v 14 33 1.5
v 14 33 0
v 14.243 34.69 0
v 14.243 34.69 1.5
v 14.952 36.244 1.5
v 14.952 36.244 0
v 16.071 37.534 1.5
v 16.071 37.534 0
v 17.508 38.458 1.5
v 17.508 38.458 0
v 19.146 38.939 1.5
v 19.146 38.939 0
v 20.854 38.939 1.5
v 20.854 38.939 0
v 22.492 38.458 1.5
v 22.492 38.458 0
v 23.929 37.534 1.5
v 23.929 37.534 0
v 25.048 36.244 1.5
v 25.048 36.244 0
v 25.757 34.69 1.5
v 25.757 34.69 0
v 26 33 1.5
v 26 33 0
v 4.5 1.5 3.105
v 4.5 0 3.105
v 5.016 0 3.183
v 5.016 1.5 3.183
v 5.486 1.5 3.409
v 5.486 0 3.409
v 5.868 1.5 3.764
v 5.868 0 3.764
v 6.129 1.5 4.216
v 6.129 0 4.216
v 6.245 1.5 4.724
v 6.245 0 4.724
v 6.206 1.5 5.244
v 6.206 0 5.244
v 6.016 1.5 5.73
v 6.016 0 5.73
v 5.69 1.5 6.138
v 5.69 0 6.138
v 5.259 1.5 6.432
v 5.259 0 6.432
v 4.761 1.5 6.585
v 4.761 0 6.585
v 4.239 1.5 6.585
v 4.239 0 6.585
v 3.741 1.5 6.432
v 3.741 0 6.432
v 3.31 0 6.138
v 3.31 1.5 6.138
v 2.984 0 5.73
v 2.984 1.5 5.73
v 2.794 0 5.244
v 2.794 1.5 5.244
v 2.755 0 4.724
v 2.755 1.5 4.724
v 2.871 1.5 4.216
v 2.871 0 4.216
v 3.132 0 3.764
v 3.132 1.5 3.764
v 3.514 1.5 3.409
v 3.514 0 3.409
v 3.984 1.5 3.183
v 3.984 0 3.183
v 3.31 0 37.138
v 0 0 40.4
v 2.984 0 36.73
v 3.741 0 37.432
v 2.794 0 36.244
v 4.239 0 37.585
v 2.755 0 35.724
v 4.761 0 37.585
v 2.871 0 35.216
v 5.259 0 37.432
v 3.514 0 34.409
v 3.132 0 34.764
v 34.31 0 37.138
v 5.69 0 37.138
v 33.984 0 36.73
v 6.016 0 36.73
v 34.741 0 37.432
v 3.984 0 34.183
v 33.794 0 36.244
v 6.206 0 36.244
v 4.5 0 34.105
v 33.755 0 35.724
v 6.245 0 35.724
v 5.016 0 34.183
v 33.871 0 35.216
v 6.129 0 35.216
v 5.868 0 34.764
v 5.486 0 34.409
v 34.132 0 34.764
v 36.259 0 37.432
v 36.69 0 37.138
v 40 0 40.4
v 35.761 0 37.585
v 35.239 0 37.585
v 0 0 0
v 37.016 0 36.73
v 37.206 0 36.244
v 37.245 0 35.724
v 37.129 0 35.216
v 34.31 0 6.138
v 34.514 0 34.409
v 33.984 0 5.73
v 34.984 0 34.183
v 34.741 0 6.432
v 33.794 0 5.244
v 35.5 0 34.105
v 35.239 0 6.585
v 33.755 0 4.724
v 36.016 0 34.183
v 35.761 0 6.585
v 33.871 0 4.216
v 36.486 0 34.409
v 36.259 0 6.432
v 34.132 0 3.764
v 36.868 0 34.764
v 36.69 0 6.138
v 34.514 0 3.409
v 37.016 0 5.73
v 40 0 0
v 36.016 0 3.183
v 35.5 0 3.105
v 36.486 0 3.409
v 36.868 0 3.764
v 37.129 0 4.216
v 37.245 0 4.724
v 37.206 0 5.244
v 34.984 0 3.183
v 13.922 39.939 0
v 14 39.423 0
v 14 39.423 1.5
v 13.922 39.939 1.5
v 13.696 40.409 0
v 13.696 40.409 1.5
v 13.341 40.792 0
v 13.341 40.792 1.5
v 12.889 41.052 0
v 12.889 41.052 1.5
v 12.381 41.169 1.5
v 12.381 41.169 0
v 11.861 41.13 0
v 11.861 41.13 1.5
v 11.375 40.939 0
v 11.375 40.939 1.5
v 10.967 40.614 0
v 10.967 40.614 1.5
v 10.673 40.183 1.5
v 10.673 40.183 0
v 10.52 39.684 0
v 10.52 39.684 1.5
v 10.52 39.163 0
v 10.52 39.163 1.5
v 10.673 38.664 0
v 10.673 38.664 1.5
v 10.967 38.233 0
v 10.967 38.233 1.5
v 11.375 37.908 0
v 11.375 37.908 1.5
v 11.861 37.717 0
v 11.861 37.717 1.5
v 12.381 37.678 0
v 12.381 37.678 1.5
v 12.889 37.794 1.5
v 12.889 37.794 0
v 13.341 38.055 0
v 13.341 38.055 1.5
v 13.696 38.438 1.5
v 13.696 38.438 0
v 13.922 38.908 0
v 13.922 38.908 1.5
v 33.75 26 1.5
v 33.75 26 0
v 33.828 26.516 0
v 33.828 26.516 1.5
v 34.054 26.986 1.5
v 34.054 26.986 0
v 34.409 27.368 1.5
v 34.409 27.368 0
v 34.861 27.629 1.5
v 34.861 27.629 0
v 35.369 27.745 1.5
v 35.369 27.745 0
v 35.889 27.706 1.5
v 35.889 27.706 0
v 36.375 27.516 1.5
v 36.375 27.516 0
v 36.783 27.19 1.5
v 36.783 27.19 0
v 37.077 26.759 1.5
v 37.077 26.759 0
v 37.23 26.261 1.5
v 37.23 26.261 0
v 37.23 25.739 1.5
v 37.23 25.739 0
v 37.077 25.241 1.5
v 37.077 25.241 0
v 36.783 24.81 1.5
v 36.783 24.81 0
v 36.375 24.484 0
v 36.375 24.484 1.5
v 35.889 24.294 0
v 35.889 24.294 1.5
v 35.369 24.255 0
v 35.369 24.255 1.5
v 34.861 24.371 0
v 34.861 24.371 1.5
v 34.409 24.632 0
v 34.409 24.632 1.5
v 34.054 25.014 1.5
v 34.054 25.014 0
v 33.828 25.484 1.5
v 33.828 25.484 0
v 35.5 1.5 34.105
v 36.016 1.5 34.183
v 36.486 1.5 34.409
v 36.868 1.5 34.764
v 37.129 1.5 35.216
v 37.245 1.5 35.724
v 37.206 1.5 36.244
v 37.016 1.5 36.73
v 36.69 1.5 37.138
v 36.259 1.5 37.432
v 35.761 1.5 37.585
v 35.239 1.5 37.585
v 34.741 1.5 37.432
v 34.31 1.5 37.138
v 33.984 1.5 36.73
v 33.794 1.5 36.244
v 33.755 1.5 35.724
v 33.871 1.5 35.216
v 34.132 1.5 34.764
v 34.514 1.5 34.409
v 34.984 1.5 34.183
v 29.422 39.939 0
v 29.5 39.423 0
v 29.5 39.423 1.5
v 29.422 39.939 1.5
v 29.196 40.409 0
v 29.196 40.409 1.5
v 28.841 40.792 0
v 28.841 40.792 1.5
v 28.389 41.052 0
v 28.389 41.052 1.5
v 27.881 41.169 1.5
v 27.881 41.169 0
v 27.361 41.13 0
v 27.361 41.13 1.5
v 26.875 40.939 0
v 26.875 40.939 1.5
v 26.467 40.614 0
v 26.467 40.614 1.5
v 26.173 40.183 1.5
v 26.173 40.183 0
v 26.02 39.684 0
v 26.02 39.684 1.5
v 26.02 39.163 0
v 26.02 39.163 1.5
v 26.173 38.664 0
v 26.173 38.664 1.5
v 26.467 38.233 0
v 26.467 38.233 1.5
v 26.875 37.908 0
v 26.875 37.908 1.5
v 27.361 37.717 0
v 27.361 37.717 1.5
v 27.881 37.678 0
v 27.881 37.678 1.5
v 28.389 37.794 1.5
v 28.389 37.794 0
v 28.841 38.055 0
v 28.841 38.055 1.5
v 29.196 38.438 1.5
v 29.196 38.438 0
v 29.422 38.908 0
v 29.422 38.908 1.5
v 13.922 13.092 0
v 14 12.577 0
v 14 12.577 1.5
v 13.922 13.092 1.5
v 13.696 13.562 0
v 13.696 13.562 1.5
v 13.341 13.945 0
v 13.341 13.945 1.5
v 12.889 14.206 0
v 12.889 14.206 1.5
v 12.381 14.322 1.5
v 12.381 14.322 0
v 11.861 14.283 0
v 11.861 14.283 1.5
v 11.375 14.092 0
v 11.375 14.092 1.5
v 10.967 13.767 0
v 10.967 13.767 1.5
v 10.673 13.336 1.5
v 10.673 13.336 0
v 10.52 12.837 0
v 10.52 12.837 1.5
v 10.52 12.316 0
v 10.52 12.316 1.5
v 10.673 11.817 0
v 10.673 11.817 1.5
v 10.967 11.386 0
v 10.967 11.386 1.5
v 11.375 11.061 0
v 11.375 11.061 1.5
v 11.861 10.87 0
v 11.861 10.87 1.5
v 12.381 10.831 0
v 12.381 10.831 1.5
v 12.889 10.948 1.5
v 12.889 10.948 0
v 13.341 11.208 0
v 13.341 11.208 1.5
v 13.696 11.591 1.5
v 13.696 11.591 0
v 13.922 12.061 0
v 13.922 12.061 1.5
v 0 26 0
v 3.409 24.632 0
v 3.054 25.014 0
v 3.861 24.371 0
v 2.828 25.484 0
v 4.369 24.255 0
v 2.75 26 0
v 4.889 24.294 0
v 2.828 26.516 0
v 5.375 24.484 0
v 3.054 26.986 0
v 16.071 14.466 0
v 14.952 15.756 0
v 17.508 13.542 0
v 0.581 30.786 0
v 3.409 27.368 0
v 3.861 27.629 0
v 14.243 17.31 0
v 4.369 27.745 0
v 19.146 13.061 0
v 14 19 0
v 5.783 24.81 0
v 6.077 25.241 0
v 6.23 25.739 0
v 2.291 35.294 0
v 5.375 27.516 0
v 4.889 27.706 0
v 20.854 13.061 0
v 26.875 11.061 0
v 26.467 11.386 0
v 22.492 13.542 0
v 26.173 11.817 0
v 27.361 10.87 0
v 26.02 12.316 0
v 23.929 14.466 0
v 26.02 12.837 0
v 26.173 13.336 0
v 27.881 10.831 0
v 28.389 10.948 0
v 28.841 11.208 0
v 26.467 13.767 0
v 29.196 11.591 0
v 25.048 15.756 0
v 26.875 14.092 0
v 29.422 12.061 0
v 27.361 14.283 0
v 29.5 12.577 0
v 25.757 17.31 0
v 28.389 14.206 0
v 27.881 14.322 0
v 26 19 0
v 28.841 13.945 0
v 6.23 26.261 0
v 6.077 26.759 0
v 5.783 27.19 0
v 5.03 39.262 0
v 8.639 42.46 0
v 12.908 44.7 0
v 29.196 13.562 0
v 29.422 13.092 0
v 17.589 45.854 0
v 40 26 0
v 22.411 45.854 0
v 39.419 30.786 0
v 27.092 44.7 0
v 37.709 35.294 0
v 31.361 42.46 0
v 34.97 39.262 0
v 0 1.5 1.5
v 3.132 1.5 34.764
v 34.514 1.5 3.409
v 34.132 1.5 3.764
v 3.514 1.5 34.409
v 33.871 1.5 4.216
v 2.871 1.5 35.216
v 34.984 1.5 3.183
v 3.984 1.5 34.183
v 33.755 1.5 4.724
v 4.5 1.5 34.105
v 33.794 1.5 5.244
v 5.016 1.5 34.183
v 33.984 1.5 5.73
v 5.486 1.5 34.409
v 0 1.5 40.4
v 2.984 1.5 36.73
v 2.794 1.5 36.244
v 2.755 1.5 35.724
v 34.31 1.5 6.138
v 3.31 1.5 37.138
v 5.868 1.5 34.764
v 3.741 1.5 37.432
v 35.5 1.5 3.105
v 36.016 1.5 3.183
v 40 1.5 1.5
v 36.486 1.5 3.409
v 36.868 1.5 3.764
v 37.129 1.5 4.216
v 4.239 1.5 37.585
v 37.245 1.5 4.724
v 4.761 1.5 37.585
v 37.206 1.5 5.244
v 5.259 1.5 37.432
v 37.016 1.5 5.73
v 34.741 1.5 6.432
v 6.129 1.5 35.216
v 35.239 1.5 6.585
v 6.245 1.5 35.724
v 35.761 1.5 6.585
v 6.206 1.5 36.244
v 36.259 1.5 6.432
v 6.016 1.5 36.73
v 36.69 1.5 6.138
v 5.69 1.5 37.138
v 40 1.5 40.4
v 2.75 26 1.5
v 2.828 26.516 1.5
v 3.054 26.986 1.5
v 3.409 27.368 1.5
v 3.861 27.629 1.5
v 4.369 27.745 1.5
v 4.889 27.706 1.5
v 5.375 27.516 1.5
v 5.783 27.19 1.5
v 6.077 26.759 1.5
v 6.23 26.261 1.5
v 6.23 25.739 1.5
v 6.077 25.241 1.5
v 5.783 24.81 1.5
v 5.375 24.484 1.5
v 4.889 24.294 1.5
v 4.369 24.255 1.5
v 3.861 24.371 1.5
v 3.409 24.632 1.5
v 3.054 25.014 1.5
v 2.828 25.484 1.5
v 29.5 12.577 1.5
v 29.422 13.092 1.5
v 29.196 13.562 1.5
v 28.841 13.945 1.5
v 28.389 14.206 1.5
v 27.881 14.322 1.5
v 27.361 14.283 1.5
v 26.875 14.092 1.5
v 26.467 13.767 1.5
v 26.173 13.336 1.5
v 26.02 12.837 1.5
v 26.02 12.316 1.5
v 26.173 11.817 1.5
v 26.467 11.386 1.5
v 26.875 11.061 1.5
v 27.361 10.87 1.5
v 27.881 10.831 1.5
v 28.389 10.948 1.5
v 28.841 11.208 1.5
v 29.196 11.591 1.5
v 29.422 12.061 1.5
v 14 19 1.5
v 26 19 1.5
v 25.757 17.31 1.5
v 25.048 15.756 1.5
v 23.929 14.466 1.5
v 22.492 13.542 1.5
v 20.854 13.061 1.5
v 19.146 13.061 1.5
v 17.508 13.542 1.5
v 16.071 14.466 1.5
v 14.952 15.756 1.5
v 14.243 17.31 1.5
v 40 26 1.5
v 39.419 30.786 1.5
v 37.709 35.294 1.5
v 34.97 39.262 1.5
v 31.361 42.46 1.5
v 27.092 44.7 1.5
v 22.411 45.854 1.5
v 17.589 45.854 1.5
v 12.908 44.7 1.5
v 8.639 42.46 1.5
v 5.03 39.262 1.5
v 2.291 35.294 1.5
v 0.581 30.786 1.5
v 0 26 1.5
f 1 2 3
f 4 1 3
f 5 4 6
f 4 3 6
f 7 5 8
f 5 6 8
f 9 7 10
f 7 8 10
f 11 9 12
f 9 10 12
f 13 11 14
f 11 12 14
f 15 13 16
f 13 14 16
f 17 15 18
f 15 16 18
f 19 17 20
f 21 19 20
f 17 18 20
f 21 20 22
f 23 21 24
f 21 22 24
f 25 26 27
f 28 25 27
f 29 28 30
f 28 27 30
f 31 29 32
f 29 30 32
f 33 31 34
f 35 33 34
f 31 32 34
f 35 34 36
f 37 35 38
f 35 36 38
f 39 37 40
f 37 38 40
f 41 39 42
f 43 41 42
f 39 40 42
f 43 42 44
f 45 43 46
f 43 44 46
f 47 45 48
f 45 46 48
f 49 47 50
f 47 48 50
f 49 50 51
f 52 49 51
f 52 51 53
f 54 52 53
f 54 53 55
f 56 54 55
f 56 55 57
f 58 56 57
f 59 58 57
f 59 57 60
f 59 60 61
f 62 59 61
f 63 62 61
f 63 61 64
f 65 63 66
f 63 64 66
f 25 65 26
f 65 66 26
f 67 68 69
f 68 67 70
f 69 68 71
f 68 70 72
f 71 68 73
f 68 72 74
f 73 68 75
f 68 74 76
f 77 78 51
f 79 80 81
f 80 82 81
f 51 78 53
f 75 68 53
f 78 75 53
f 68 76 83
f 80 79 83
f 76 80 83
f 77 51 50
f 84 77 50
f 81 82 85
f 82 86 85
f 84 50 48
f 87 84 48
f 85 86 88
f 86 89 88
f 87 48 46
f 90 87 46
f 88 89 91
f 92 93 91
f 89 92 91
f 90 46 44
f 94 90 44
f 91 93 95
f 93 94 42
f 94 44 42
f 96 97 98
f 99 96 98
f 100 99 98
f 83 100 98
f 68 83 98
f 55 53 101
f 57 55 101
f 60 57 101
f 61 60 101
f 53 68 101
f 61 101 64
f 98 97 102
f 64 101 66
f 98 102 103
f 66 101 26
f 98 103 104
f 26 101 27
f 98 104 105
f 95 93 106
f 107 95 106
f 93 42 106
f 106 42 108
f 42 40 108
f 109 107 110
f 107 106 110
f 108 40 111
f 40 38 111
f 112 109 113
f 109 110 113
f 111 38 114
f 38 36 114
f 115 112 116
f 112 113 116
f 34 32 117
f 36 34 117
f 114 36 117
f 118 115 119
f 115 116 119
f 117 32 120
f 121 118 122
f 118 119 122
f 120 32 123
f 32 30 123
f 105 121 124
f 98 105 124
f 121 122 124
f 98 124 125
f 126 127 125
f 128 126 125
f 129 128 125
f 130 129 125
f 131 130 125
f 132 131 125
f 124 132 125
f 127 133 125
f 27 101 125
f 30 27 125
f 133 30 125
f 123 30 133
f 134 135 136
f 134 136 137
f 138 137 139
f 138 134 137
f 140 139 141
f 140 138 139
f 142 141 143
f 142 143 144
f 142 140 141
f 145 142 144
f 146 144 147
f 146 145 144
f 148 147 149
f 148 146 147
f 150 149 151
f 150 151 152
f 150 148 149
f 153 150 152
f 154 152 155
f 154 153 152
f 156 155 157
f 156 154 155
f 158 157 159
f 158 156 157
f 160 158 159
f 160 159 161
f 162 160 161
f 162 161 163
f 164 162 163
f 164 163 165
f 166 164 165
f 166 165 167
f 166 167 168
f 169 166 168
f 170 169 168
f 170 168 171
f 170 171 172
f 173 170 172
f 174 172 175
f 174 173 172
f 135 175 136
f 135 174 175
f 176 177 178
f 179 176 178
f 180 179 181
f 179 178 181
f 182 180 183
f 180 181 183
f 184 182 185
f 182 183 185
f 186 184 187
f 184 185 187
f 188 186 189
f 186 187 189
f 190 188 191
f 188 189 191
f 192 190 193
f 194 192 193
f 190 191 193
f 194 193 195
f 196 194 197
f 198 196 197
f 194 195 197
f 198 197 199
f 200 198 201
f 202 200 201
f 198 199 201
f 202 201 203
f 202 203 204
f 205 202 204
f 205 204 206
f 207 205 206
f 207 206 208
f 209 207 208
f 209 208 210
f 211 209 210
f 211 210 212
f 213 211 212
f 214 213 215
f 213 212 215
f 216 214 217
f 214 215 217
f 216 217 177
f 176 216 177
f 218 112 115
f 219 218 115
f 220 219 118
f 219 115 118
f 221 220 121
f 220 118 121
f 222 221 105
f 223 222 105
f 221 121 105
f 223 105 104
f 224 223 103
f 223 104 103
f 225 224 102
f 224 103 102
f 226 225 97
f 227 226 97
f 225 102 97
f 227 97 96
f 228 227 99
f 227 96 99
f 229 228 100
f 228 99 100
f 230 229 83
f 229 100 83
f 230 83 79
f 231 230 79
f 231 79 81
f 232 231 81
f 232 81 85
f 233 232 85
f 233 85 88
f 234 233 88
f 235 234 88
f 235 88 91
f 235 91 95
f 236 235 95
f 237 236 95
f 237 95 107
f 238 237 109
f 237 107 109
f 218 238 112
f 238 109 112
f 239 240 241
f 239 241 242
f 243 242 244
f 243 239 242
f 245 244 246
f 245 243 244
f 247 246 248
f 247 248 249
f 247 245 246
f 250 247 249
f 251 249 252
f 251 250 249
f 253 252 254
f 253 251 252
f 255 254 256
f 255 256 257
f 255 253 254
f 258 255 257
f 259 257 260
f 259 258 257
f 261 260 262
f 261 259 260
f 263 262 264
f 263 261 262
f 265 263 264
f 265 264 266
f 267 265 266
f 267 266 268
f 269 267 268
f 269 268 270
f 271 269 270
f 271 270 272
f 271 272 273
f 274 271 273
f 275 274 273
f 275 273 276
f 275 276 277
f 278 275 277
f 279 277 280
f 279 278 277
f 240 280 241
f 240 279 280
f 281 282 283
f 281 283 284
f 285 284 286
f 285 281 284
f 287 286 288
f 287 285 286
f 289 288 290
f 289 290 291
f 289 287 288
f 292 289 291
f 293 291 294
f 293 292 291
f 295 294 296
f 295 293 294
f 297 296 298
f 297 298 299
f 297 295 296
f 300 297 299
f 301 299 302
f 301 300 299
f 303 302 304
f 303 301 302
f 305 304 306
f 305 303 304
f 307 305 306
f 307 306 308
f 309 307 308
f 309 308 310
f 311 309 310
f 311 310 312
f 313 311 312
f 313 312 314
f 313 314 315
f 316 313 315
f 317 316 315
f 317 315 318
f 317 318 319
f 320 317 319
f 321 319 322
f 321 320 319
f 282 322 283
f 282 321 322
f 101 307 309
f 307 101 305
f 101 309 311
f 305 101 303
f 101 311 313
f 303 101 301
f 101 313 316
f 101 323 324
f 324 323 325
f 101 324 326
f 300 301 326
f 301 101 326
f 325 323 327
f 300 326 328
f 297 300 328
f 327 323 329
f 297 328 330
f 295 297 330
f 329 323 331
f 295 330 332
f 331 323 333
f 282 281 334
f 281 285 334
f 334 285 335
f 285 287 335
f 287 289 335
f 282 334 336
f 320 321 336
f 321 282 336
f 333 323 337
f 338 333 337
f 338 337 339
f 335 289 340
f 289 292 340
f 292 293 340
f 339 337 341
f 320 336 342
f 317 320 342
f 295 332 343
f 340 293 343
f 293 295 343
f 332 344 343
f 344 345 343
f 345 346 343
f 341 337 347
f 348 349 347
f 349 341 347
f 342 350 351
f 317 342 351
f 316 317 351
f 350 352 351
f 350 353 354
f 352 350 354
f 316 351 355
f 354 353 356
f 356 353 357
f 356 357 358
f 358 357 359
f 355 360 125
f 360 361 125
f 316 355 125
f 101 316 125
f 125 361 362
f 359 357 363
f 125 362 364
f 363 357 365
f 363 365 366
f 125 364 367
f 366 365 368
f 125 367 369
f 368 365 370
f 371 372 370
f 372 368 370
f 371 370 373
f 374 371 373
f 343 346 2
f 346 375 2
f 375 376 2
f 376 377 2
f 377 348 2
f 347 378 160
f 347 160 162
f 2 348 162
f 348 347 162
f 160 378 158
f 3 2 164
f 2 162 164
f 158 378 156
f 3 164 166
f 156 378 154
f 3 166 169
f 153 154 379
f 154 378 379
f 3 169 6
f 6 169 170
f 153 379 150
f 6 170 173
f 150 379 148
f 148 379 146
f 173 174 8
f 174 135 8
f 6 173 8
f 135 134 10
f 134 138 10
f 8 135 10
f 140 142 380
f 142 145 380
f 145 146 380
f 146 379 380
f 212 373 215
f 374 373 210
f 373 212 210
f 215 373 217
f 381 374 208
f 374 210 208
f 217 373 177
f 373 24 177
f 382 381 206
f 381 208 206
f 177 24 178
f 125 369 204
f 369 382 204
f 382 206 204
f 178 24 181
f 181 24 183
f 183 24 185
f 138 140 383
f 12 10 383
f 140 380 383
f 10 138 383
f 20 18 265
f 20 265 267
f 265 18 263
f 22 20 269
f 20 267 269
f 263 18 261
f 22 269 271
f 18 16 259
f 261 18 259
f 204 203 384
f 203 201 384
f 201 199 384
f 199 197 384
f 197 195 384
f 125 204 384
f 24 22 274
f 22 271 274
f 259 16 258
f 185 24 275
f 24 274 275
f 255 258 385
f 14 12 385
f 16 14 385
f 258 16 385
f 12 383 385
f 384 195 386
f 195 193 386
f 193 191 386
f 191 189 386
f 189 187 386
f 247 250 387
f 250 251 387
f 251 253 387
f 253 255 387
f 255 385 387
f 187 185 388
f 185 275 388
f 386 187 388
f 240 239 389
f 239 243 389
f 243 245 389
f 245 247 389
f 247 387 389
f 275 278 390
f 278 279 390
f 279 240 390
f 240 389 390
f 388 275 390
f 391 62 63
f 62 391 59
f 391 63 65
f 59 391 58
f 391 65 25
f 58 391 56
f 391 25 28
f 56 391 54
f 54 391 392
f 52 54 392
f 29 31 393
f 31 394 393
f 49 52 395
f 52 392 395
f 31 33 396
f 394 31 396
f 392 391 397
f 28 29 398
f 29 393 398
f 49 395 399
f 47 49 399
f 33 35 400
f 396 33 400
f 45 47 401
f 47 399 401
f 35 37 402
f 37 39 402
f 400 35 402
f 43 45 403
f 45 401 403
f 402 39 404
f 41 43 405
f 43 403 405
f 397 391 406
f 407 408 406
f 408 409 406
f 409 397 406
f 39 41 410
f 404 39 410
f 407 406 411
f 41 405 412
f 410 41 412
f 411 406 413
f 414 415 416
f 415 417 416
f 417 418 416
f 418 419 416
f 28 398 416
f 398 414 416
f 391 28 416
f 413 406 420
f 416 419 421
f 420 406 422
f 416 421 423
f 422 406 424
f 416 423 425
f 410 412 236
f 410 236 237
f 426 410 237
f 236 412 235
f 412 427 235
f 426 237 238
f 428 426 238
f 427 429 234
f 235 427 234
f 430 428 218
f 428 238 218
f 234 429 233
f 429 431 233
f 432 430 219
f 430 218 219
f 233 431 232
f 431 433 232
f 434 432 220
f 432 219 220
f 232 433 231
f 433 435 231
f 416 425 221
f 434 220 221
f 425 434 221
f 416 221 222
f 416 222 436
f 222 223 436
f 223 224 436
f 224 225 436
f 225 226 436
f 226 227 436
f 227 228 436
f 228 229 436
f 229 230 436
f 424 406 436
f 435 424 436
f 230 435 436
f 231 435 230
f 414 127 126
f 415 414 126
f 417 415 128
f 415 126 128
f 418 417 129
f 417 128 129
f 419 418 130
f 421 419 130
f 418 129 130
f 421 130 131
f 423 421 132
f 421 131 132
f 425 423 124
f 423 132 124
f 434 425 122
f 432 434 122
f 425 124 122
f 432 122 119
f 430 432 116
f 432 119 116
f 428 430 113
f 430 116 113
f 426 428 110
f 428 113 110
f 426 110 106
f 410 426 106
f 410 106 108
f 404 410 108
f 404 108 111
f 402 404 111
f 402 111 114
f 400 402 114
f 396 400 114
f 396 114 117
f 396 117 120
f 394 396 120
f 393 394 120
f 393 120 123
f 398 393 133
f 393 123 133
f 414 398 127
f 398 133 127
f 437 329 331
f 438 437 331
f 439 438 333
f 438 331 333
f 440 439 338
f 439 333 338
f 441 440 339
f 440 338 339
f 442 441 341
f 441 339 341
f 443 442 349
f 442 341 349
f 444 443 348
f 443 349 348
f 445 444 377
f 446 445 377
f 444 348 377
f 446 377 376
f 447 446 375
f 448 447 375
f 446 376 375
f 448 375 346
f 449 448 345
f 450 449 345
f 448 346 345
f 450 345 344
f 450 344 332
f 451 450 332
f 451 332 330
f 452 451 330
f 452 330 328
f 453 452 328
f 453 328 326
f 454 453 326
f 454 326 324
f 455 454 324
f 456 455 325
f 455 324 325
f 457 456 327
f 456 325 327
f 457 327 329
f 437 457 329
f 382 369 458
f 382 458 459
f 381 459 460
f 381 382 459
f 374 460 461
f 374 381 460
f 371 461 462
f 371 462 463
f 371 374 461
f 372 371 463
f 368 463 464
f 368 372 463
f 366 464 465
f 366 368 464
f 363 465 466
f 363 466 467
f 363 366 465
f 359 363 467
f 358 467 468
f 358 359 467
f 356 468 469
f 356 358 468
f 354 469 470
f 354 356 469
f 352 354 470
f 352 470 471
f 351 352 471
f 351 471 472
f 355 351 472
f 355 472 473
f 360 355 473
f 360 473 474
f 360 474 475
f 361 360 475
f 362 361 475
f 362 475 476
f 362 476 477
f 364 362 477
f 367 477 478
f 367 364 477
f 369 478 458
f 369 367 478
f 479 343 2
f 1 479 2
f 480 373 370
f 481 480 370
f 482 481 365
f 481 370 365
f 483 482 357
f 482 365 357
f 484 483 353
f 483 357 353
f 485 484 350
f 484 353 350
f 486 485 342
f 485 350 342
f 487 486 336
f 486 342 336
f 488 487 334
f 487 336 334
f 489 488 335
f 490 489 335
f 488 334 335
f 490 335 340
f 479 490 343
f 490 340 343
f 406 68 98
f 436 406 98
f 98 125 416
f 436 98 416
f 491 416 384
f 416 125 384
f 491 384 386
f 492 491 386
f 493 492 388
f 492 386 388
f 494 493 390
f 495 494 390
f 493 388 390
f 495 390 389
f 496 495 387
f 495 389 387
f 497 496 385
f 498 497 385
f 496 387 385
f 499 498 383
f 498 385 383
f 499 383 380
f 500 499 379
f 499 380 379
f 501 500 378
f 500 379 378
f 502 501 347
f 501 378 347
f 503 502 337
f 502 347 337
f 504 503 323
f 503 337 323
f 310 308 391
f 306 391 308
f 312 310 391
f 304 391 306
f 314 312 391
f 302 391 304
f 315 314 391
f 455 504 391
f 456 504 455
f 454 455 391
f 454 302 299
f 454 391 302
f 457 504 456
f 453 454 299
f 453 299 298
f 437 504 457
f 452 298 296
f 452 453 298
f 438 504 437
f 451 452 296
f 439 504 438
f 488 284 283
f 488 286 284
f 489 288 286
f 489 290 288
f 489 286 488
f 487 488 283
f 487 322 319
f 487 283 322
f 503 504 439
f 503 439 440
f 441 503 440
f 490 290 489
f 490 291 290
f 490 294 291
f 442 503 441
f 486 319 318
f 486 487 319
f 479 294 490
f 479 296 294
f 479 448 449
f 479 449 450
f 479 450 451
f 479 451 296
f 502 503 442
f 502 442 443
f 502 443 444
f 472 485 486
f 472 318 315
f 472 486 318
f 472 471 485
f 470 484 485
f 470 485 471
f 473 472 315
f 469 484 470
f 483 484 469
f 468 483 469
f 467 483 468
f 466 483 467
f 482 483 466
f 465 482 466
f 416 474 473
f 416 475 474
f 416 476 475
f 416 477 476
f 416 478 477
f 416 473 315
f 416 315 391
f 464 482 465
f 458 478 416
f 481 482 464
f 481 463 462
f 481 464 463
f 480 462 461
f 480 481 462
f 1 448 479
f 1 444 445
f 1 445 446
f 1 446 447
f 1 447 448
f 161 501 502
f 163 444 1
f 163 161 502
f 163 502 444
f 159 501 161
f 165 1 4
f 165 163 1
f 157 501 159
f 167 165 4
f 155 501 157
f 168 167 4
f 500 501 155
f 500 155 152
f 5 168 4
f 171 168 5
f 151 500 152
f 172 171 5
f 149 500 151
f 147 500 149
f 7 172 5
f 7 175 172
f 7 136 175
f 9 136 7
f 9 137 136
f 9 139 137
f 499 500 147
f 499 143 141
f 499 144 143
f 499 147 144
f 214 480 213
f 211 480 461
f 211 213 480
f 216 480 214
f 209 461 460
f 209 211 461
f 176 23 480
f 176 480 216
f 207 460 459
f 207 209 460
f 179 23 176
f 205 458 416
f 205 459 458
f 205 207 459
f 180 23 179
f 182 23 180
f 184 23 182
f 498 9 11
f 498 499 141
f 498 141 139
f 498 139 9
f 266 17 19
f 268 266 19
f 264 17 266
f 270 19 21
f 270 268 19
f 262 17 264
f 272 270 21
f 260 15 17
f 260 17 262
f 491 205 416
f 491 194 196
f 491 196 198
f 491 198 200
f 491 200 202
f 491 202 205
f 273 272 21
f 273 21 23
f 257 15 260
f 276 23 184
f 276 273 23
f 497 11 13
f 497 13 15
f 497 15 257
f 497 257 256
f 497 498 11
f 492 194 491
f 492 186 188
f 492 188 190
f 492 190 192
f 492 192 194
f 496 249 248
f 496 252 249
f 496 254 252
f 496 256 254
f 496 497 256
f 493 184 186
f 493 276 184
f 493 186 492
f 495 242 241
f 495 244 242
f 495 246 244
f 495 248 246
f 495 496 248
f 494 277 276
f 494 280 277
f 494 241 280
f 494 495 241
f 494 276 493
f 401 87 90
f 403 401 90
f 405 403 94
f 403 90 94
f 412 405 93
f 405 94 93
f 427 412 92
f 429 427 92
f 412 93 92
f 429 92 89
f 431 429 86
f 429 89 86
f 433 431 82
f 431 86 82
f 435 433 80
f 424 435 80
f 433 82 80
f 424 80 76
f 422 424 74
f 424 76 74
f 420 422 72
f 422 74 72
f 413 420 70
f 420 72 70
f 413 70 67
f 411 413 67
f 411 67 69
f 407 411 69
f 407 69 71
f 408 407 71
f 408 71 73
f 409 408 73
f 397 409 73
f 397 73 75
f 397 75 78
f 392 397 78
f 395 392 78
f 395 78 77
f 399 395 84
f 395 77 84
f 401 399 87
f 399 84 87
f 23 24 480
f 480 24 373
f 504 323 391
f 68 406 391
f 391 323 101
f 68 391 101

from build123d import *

# Parameters (mm, degrees)
SKETCH1_R           = 1.75
BOSS_EXTRUDE1_DEPTH = 1.5
SKETCH2_W           = 40
SKETCH2_H           = 40.4
SKETCH2_R           = 1.75
BOSS_EXTRUDE2_DEPTH = 1.5


with BuildPart() as part:
    # Sketch1 → Boss-Extrude1 (new body)
    # profile 1 of 2: a face of its own
    with BuildSketch(Plane.XY):
        with BuildLine():
            Line((0, 26), (0, 0))
            Line((0, 0), (40, 0))
            Line((40, 0), (40, 26))
            Line((40, 26), (37.25, 26))
            ThreePointArc((37.25, 26), (35.5, 24.25), (33.75, 26))
            Line((33.75, 26), (26, 26))
            Line((26, 26), (26, 19))
            ThreePointArc((26, 19), (20, 13), (14, 19))
            Line((14, 19), (14, 26))
            Line((14, 26), (6.25, 26))
            ThreePointArc((6.25, 26), (4.5, 24.25), (2.75, 26))
            Line((2.75, 26), (0, 26))
        make_face()
        with Locations((12.25, 12.576606241)):
            Circle(SKETCH1_R, mode=Mode.SUBTRACT)
        with Locations((27.75, 12.576606241)):
            Circle(SKETCH1_R, mode=Mode.SUBTRACT)
    # profile 2 of 2: a face of its own
    with BuildSketch(Plane.XY):
        with BuildLine():
            ThreePointArc((40, 26), (20, 46), (0, 26))
            Line((0, 26), (2.75, 26))
            ThreePointArc((2.75, 26), (4.5, 27.75), (6.25, 26))
            Line((6.25, 26), (14, 26))
            Line((14, 26), (14, 33))
            ThreePointArc((14, 33), (20, 39), (26, 33))
            Line((26, 33), (26, 26))
            Line((26, 26), (33.75, 26))
            ThreePointArc((33.75, 26), (35.5, 27.75), (37.25, 26))
            Line((37.25, 26), (40, 26))
        make_face()
        with Locations((12.25, 39.423393759)):
            Circle(SKETCH1_R, mode=Mode.SUBTRACT)
        with Locations((27.75, 39.423393759)):
            Circle(SKETCH1_R, mode=Mode.SUBTRACT)
    extrude(amount=BOSS_EXTRUDE1_DEPTH)

    # Sketch2 → Boss-Extrude2 (add)
    with BuildSketch(Plane.XZ):
        with Locations((20, 20.2)):
            Rectangle(SKETCH2_W, SKETCH2_H)
        with Locations(Location((4.5, 35.855, 0), (0, 0, 270))):
            Circle(SKETCH2_R, mode=Mode.SUBTRACT)
        with Locations(Location((35.5, 35.855, 0), (0, 0, 270))):
            Circle(SKETCH2_R, mode=Mode.SUBTRACT)
        with Locations(Location((35.5, 4.855, 0), (0, 0, 270))):
            Circle(SKETCH2_R, mode=Mode.SUBTRACT)
        with Locations(Location((4.5, 4.855, 0), (0, 0, 270))):
            Circle(SKETCH2_R, mode=Mode.SUBTRACT)
    extrude(amount=-BOSS_EXTRUDE2_DEPTH)


solid = part.part
